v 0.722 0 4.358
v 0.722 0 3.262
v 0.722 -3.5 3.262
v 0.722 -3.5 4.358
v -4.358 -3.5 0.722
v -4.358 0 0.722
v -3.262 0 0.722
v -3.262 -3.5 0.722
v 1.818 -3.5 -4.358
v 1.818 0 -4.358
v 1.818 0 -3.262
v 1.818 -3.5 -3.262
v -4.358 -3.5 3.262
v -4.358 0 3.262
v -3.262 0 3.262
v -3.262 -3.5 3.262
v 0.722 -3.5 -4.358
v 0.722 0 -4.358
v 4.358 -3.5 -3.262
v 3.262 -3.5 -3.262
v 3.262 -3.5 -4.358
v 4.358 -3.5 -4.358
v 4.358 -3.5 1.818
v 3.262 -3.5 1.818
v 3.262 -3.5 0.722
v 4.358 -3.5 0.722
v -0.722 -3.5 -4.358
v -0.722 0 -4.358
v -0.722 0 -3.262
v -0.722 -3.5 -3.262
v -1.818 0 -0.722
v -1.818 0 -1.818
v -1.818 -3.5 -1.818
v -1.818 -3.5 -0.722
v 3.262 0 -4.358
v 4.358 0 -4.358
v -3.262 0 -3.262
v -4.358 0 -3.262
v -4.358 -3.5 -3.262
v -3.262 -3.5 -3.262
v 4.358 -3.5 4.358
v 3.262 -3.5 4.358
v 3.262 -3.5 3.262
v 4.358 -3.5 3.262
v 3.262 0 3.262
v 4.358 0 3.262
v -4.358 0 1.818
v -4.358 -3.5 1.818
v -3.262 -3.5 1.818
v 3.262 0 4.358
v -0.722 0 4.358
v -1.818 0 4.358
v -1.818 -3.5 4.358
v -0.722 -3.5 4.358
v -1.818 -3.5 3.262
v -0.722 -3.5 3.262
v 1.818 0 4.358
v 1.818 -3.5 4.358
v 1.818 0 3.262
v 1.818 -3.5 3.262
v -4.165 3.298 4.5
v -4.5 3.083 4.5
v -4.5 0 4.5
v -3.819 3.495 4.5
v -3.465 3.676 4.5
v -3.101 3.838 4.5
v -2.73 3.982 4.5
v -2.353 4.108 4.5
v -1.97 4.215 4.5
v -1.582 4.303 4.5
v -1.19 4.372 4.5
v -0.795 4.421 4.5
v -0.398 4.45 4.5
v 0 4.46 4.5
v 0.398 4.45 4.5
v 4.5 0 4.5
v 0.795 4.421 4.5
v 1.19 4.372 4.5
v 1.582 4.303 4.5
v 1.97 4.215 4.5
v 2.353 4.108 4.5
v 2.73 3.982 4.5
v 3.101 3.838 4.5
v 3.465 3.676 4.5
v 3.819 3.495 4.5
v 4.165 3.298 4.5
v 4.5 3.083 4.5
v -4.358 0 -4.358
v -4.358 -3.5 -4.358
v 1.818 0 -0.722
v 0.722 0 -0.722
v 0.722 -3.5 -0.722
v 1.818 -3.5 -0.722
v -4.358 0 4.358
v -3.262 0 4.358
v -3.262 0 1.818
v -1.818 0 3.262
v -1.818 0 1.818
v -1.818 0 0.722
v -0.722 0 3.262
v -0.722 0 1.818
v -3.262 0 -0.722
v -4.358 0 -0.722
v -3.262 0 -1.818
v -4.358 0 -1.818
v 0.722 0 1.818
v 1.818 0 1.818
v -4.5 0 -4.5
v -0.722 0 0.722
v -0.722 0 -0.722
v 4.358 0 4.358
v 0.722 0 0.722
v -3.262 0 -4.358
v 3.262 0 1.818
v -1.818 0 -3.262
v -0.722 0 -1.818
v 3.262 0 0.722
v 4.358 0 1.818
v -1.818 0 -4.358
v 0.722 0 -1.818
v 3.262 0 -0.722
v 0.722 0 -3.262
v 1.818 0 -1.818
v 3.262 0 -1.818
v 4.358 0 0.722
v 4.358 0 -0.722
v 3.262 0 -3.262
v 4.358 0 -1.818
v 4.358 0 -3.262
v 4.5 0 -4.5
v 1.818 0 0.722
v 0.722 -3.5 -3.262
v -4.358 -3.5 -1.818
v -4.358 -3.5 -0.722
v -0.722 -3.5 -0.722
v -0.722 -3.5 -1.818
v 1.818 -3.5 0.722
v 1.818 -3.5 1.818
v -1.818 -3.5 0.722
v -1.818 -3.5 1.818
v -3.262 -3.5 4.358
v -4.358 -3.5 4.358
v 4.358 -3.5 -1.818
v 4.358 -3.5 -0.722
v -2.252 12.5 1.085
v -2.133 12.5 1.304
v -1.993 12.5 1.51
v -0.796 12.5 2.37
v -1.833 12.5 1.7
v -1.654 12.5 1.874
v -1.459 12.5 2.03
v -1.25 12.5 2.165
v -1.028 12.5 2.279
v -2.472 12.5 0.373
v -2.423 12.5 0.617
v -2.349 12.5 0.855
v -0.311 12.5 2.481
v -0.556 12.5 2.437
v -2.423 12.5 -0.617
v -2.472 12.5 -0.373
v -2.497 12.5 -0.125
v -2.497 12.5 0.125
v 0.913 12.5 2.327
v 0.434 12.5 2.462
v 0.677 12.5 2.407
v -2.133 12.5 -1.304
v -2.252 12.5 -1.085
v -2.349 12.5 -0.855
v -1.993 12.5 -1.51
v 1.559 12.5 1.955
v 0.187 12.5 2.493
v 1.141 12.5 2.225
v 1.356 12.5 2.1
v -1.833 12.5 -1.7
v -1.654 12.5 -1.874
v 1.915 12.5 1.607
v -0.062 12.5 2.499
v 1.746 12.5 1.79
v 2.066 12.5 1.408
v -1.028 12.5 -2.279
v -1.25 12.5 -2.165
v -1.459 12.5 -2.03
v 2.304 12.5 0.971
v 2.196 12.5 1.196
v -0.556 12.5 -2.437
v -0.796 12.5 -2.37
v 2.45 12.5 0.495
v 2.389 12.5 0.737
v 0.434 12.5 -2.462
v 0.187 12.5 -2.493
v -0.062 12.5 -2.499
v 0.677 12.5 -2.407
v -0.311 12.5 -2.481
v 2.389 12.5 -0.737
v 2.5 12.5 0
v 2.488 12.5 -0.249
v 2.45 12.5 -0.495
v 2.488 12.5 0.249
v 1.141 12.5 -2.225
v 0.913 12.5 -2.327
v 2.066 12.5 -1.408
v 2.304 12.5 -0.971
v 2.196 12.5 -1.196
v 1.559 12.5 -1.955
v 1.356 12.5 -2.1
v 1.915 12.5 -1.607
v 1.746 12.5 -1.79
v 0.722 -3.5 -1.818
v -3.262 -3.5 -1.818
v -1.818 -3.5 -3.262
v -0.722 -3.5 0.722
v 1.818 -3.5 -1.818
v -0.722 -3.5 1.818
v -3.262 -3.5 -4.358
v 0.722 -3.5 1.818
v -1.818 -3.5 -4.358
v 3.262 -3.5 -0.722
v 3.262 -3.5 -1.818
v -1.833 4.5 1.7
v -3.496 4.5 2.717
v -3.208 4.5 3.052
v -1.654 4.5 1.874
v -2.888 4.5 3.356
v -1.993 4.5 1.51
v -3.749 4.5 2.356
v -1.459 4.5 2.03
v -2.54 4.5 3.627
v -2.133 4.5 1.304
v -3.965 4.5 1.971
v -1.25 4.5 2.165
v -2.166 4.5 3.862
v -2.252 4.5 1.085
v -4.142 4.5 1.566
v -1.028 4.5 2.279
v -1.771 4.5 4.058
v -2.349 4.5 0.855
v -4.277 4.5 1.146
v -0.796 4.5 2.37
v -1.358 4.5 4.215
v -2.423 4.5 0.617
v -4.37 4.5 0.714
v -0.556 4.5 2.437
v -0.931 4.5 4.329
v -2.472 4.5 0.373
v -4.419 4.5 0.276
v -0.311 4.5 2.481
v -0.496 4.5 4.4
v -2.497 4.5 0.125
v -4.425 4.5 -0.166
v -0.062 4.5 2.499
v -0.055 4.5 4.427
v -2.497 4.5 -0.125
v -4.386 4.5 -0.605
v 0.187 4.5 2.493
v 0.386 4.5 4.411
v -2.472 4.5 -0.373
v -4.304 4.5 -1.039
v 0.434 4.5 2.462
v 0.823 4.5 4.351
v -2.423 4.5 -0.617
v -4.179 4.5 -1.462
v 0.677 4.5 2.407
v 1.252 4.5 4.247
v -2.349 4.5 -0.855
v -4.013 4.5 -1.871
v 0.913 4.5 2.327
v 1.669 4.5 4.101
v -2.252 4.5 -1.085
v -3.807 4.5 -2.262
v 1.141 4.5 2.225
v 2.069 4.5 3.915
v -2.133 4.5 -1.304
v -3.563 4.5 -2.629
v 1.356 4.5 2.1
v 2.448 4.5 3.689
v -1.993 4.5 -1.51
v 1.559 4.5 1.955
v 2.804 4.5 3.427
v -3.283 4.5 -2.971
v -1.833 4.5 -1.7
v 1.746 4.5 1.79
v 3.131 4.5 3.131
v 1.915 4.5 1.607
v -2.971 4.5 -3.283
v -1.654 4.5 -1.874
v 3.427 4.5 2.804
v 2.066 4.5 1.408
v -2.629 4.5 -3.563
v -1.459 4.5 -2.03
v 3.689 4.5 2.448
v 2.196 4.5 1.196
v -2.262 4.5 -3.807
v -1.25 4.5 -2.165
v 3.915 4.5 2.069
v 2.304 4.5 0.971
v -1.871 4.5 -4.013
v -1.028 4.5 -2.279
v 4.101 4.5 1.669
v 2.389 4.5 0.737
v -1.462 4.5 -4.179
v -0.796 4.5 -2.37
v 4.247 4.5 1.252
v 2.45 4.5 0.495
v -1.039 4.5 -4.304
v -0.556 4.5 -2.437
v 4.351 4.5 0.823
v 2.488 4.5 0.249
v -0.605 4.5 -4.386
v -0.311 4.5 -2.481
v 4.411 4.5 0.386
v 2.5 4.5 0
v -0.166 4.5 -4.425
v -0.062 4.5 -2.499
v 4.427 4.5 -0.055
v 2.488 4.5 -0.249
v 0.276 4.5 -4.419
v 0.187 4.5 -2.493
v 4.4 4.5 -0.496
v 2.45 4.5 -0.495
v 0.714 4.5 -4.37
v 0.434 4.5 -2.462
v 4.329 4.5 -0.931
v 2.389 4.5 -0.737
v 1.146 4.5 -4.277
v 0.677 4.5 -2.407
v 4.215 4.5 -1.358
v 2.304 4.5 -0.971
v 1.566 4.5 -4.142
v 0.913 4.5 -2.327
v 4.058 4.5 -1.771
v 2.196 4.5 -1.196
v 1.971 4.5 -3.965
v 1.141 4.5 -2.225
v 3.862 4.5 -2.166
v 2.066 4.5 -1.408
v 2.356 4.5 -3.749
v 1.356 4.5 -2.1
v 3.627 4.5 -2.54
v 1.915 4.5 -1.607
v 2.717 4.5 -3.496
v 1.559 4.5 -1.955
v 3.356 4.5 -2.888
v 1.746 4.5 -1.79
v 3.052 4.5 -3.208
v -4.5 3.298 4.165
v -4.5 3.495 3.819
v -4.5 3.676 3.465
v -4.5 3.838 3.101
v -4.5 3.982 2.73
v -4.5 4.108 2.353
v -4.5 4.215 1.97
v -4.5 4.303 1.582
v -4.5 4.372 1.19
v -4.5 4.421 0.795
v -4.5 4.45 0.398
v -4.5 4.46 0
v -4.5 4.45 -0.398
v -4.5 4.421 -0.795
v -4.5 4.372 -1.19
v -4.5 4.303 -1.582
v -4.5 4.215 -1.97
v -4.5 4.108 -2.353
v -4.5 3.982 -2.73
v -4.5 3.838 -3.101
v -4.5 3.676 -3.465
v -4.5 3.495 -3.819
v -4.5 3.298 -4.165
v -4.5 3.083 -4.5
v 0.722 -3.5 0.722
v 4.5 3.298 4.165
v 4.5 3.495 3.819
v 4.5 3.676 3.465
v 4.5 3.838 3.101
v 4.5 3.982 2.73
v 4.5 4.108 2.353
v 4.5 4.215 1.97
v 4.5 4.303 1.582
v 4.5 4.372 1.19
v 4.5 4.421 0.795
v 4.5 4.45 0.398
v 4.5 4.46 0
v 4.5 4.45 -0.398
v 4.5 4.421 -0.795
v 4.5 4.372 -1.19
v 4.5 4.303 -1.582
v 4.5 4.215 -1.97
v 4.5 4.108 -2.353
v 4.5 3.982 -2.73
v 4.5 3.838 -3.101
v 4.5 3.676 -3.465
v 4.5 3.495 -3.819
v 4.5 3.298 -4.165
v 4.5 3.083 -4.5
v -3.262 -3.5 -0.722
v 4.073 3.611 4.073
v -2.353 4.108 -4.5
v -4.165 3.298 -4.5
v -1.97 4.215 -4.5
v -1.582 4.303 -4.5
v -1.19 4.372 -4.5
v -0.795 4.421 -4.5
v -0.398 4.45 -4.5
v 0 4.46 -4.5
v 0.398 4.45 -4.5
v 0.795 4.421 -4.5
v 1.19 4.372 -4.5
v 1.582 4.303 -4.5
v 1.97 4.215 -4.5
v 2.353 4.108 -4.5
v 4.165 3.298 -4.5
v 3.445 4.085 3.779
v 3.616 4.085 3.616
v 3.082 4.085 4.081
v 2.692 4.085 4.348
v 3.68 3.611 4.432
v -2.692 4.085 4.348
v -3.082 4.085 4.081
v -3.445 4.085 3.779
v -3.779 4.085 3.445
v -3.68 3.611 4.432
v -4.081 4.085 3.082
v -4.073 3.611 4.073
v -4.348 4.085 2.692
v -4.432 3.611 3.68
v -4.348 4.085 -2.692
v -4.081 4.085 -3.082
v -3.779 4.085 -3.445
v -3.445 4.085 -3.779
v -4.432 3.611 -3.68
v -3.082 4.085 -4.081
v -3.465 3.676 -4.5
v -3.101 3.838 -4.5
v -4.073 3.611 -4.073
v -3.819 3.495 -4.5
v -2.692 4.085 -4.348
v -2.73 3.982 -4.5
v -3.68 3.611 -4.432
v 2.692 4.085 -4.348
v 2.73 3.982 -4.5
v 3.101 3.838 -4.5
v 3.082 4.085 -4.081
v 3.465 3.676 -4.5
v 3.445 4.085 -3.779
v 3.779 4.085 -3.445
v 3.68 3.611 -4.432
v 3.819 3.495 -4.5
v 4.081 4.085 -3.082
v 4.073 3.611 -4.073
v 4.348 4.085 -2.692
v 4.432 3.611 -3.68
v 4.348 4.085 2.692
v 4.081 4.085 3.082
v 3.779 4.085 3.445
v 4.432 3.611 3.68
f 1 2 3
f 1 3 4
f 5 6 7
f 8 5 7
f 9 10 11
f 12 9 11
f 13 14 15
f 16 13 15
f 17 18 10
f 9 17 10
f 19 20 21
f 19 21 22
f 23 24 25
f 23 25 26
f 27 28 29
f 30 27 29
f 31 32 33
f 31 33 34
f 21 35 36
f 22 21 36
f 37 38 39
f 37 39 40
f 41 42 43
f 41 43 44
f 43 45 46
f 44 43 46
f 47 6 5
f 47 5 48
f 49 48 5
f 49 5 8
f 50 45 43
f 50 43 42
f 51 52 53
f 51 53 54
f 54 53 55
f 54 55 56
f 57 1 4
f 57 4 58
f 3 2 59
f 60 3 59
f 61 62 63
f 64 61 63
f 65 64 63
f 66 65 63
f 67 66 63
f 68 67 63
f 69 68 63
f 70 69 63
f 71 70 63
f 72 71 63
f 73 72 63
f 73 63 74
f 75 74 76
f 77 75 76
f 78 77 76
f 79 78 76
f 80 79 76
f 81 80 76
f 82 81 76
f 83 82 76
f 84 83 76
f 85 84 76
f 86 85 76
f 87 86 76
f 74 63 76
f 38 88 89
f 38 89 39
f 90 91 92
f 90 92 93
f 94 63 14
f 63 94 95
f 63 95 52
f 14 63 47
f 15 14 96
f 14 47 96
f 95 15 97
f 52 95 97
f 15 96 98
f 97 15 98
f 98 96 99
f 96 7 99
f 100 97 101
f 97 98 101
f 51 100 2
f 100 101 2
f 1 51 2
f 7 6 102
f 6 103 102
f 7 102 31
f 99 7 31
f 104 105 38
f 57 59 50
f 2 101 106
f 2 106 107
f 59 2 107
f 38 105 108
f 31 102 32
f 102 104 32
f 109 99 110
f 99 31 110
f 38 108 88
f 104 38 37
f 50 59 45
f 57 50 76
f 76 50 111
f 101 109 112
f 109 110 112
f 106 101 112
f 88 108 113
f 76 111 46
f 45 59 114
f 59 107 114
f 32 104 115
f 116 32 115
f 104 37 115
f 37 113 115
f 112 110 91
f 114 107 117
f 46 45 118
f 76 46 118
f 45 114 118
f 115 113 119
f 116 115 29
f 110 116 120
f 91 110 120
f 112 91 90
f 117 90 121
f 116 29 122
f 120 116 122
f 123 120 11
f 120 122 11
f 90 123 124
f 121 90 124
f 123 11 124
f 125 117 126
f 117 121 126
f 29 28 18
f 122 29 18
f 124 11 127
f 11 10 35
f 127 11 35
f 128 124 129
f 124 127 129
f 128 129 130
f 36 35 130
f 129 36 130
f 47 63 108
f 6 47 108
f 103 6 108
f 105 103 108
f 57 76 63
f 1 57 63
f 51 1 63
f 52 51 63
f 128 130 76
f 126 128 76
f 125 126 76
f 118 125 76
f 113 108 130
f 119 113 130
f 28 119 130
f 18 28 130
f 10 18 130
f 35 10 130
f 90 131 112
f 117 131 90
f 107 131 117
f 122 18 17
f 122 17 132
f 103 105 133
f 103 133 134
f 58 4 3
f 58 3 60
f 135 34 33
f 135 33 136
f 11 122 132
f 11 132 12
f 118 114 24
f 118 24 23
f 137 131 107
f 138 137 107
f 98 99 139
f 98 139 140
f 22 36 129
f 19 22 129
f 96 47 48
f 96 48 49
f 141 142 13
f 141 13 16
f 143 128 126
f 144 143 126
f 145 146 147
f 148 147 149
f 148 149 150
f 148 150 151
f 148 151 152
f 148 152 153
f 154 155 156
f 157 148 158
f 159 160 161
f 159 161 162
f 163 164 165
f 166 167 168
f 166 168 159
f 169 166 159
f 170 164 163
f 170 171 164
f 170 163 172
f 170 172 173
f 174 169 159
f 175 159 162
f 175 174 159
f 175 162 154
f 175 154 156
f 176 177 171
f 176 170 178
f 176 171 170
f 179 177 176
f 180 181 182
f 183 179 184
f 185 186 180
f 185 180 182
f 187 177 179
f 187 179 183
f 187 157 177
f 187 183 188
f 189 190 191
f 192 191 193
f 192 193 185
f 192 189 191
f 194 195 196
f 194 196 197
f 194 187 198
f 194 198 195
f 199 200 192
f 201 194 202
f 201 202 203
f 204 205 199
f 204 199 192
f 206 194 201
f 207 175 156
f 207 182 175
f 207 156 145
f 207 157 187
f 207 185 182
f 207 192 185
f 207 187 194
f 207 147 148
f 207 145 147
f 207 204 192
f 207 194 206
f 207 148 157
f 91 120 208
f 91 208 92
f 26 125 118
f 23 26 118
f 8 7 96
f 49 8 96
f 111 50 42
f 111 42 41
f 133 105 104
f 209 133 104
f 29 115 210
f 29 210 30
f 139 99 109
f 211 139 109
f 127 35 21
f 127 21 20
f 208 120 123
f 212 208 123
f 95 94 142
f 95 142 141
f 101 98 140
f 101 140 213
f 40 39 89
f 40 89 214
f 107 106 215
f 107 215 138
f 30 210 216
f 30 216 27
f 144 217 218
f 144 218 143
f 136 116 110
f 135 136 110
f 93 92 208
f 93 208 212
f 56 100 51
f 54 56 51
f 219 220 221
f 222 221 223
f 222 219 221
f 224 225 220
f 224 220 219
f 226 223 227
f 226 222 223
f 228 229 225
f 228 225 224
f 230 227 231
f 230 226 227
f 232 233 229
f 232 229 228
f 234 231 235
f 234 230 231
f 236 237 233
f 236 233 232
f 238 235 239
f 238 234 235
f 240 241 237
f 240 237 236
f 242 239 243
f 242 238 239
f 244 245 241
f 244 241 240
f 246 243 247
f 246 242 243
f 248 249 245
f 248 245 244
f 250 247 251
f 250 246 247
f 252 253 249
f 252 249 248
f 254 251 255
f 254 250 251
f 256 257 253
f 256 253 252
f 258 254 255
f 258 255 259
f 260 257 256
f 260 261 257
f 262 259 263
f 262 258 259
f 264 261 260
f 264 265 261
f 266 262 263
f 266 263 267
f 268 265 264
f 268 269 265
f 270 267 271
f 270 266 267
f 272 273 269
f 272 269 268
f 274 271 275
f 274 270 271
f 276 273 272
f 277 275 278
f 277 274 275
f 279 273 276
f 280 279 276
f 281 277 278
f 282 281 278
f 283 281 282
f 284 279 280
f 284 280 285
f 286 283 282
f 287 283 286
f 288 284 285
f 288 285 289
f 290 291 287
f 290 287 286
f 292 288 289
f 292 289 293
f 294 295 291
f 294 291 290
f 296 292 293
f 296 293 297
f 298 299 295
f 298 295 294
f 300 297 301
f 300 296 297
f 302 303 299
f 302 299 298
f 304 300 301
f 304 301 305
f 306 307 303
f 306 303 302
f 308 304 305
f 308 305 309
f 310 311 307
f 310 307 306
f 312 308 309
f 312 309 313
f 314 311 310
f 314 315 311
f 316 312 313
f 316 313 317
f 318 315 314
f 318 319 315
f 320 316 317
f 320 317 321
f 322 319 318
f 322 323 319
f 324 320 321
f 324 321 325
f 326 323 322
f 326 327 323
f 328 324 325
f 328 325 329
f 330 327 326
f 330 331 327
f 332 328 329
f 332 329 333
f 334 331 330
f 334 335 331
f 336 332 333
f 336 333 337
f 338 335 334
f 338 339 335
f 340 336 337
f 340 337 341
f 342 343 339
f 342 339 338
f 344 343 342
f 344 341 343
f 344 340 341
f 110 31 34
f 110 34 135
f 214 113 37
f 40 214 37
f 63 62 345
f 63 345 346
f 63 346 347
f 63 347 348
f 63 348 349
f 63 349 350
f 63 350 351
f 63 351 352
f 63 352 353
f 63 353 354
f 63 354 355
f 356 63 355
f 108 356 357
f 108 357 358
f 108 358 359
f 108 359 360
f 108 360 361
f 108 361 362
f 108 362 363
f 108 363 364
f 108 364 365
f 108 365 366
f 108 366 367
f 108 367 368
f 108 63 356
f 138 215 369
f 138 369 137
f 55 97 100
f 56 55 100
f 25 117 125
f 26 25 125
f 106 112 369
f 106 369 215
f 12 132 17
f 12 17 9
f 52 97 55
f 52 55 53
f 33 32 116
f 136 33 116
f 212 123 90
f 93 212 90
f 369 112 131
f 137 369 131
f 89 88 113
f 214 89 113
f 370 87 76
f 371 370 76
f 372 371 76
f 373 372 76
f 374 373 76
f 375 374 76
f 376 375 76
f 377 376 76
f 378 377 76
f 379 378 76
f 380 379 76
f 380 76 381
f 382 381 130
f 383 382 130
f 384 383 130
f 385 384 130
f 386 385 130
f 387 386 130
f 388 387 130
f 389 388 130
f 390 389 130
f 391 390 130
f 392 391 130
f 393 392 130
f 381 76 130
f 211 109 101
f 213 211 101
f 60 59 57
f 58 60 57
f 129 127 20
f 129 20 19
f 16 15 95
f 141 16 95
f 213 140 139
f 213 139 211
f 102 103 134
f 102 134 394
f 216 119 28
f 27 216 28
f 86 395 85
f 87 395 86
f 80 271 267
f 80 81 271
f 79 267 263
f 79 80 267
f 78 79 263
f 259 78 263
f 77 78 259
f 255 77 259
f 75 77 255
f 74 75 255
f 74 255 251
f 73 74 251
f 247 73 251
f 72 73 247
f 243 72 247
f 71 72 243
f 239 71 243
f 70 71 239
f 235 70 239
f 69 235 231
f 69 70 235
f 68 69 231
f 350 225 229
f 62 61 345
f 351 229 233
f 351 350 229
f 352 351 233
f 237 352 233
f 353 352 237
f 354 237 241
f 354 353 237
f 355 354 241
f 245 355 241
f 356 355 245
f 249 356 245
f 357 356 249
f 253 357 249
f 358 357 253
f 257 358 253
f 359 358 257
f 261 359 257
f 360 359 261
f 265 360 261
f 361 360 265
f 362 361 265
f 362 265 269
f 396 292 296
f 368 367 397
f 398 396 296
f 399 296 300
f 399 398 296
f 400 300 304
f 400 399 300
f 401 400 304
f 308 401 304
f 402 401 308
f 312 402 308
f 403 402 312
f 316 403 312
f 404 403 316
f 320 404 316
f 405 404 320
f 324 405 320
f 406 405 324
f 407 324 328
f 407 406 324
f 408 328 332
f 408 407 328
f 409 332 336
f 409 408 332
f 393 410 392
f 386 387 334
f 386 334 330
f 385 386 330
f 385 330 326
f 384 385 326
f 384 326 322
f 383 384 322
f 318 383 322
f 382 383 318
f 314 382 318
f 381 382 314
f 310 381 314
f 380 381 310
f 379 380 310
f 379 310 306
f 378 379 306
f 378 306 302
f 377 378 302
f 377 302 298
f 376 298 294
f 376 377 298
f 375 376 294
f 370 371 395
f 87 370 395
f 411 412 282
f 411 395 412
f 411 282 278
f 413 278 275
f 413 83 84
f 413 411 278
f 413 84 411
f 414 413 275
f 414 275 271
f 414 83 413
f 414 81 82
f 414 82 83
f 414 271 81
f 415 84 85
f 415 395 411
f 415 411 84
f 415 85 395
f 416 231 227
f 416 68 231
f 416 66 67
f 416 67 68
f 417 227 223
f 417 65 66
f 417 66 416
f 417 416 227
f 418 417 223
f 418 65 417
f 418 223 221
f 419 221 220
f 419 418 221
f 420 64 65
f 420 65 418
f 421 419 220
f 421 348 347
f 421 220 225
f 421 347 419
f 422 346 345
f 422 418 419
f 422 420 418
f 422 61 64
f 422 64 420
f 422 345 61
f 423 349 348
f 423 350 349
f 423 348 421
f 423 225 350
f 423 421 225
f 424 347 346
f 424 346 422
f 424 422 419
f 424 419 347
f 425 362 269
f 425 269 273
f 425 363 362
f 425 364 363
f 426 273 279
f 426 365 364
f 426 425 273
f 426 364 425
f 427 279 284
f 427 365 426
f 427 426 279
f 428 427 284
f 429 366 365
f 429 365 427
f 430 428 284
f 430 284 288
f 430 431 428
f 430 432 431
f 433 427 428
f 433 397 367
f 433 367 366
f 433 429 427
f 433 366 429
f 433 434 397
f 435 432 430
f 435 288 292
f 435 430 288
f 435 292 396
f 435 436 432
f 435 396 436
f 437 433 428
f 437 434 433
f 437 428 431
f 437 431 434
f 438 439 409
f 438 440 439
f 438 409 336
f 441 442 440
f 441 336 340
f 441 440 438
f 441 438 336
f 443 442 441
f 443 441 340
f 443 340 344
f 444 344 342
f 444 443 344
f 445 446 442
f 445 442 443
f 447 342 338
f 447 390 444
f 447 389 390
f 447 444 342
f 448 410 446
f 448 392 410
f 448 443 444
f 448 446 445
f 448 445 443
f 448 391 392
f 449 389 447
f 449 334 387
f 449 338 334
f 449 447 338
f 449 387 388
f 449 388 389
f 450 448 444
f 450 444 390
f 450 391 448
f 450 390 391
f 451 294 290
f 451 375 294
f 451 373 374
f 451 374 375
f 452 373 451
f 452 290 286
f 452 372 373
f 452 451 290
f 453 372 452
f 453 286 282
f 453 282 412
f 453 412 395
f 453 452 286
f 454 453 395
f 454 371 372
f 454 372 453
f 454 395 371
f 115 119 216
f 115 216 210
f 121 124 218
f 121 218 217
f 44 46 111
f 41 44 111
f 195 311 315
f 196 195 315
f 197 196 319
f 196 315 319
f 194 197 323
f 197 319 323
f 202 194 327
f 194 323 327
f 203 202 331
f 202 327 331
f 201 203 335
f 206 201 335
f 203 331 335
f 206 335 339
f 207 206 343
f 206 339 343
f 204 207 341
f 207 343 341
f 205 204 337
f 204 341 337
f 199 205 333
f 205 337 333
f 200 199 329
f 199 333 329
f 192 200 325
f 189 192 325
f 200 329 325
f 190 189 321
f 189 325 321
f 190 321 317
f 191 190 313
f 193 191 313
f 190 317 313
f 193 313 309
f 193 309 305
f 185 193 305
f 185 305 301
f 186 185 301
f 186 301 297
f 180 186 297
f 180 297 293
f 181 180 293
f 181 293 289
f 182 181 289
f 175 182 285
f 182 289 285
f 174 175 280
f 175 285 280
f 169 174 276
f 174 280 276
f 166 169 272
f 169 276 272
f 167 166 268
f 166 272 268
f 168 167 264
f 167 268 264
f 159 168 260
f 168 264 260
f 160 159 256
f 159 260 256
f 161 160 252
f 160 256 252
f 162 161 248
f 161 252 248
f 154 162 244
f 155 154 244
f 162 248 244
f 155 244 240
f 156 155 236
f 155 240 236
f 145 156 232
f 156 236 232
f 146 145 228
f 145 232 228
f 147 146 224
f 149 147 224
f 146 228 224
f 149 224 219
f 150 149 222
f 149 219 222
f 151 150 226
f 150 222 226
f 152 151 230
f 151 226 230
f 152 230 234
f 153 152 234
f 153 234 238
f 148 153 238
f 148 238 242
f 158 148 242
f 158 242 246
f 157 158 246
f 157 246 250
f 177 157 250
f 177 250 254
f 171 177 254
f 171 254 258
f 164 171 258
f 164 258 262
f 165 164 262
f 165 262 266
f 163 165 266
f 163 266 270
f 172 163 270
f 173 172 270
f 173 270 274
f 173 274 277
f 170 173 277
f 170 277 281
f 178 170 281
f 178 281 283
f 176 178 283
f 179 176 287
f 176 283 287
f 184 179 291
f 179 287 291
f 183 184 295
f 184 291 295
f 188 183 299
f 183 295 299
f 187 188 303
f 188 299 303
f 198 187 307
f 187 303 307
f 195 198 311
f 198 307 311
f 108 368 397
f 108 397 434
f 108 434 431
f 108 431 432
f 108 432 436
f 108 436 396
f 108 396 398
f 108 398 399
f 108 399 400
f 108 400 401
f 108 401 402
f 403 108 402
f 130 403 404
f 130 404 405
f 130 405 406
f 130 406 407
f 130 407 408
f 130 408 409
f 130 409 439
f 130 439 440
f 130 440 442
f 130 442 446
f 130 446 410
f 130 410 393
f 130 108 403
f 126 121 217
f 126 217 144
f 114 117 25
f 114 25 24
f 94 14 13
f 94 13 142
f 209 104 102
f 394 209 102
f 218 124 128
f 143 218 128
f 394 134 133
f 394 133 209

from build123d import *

# Parameters (mm, degrees)
SKETCH1_W            = 9
SKETCH1_H            = 9
BOSS_EXTRUDE1_DEPTH  = 4.5
SKETCH3_W            = 1.096908344
SKETCH3_H            = 1.096908344
BOSS_EXTRUDE3_DEPTH  = 3.5
LPATTERN1_COUNT      = 4
LPATTERN1_PITCH      = 2.54
LPATTERN1_COUNT_DIR2 = 4
LPATTERN1_PITCH_DIR2 = 2.54
SKETCH4_R            = 2.5
BOSS_EXTRUDE4_DEPTH  = 8


with BuildPart() as part:
    # Sketch1 → Boss-Extrude1 (new body)
    with BuildSketch(Plane(origin=(0, 0, 0), x_dir=(1, 0, 0), z_dir=(0, 1, 0))):
        Rectangle(SKETCH1_W, SKETCH1_H)
    extrude(amount=BOSS_EXTRUDE1_DEPTH)

    # Sketch3 → Boss-Extrude3 (add)
    with BuildSketch(Plane.XZ):
        with Locations((-3.81, 3.81)):
            Rectangle(SKETCH3_W, SKETCH3_H)
    boss_extrude3 = extrude(amount=BOSS_EXTRUDE3_DEPTH)

    # LPattern1: Boss-Extrude3 4 × 4
    with Locations(*[(i * LPATTERN1_PITCH, 0, -j * LPATTERN1_PITCH_DIR2) for i in range(LPATTERN1_COUNT) for j in range(LPATTERN1_COUNT_DIR2) if (i, j) != (0, 0)]):
        add(boss_extrude3)

    # Sketch4 → Boss-Extrude4 (add)
    with BuildSketch(Plane(origin=(0, 4.5, 0), x_dir=(1, 0, 0), z_dir=(0, 1, 0))):
        Circle(SKETCH4_R)
    extrude(amount=BOSS_EXTRUDE4_DEPTH)

    # Sketch6 → Cut-Revolve2 (revolve, cut)
    with BuildSketch(Plane(origin=(0, 0, 0), x_dir=(-0.707106781, 0, -0.707106781), z_dir=(0.707106781, 0, -0.707106781))):
        with BuildLine():
            Line((-8.778012628, -0.773952942), (-8.778012628, 5.788941631))
            Line((-8.778012628, 5.788941631), (-4.42783745, 5.788941631))
            Line((-4.42783745, 5.788941631), (-4.42783745, 4.5))
            ThreePointArc((-4.42783745, 4.5), (-7.110011532, 2.281289505), (-8.778012628, -0.773952942))
        make_face()
    revolve(axis=Axis((0, 4.5, 0), (0, -1, 0)), mode=Mode.SUBTRACT)


solid = part.part
